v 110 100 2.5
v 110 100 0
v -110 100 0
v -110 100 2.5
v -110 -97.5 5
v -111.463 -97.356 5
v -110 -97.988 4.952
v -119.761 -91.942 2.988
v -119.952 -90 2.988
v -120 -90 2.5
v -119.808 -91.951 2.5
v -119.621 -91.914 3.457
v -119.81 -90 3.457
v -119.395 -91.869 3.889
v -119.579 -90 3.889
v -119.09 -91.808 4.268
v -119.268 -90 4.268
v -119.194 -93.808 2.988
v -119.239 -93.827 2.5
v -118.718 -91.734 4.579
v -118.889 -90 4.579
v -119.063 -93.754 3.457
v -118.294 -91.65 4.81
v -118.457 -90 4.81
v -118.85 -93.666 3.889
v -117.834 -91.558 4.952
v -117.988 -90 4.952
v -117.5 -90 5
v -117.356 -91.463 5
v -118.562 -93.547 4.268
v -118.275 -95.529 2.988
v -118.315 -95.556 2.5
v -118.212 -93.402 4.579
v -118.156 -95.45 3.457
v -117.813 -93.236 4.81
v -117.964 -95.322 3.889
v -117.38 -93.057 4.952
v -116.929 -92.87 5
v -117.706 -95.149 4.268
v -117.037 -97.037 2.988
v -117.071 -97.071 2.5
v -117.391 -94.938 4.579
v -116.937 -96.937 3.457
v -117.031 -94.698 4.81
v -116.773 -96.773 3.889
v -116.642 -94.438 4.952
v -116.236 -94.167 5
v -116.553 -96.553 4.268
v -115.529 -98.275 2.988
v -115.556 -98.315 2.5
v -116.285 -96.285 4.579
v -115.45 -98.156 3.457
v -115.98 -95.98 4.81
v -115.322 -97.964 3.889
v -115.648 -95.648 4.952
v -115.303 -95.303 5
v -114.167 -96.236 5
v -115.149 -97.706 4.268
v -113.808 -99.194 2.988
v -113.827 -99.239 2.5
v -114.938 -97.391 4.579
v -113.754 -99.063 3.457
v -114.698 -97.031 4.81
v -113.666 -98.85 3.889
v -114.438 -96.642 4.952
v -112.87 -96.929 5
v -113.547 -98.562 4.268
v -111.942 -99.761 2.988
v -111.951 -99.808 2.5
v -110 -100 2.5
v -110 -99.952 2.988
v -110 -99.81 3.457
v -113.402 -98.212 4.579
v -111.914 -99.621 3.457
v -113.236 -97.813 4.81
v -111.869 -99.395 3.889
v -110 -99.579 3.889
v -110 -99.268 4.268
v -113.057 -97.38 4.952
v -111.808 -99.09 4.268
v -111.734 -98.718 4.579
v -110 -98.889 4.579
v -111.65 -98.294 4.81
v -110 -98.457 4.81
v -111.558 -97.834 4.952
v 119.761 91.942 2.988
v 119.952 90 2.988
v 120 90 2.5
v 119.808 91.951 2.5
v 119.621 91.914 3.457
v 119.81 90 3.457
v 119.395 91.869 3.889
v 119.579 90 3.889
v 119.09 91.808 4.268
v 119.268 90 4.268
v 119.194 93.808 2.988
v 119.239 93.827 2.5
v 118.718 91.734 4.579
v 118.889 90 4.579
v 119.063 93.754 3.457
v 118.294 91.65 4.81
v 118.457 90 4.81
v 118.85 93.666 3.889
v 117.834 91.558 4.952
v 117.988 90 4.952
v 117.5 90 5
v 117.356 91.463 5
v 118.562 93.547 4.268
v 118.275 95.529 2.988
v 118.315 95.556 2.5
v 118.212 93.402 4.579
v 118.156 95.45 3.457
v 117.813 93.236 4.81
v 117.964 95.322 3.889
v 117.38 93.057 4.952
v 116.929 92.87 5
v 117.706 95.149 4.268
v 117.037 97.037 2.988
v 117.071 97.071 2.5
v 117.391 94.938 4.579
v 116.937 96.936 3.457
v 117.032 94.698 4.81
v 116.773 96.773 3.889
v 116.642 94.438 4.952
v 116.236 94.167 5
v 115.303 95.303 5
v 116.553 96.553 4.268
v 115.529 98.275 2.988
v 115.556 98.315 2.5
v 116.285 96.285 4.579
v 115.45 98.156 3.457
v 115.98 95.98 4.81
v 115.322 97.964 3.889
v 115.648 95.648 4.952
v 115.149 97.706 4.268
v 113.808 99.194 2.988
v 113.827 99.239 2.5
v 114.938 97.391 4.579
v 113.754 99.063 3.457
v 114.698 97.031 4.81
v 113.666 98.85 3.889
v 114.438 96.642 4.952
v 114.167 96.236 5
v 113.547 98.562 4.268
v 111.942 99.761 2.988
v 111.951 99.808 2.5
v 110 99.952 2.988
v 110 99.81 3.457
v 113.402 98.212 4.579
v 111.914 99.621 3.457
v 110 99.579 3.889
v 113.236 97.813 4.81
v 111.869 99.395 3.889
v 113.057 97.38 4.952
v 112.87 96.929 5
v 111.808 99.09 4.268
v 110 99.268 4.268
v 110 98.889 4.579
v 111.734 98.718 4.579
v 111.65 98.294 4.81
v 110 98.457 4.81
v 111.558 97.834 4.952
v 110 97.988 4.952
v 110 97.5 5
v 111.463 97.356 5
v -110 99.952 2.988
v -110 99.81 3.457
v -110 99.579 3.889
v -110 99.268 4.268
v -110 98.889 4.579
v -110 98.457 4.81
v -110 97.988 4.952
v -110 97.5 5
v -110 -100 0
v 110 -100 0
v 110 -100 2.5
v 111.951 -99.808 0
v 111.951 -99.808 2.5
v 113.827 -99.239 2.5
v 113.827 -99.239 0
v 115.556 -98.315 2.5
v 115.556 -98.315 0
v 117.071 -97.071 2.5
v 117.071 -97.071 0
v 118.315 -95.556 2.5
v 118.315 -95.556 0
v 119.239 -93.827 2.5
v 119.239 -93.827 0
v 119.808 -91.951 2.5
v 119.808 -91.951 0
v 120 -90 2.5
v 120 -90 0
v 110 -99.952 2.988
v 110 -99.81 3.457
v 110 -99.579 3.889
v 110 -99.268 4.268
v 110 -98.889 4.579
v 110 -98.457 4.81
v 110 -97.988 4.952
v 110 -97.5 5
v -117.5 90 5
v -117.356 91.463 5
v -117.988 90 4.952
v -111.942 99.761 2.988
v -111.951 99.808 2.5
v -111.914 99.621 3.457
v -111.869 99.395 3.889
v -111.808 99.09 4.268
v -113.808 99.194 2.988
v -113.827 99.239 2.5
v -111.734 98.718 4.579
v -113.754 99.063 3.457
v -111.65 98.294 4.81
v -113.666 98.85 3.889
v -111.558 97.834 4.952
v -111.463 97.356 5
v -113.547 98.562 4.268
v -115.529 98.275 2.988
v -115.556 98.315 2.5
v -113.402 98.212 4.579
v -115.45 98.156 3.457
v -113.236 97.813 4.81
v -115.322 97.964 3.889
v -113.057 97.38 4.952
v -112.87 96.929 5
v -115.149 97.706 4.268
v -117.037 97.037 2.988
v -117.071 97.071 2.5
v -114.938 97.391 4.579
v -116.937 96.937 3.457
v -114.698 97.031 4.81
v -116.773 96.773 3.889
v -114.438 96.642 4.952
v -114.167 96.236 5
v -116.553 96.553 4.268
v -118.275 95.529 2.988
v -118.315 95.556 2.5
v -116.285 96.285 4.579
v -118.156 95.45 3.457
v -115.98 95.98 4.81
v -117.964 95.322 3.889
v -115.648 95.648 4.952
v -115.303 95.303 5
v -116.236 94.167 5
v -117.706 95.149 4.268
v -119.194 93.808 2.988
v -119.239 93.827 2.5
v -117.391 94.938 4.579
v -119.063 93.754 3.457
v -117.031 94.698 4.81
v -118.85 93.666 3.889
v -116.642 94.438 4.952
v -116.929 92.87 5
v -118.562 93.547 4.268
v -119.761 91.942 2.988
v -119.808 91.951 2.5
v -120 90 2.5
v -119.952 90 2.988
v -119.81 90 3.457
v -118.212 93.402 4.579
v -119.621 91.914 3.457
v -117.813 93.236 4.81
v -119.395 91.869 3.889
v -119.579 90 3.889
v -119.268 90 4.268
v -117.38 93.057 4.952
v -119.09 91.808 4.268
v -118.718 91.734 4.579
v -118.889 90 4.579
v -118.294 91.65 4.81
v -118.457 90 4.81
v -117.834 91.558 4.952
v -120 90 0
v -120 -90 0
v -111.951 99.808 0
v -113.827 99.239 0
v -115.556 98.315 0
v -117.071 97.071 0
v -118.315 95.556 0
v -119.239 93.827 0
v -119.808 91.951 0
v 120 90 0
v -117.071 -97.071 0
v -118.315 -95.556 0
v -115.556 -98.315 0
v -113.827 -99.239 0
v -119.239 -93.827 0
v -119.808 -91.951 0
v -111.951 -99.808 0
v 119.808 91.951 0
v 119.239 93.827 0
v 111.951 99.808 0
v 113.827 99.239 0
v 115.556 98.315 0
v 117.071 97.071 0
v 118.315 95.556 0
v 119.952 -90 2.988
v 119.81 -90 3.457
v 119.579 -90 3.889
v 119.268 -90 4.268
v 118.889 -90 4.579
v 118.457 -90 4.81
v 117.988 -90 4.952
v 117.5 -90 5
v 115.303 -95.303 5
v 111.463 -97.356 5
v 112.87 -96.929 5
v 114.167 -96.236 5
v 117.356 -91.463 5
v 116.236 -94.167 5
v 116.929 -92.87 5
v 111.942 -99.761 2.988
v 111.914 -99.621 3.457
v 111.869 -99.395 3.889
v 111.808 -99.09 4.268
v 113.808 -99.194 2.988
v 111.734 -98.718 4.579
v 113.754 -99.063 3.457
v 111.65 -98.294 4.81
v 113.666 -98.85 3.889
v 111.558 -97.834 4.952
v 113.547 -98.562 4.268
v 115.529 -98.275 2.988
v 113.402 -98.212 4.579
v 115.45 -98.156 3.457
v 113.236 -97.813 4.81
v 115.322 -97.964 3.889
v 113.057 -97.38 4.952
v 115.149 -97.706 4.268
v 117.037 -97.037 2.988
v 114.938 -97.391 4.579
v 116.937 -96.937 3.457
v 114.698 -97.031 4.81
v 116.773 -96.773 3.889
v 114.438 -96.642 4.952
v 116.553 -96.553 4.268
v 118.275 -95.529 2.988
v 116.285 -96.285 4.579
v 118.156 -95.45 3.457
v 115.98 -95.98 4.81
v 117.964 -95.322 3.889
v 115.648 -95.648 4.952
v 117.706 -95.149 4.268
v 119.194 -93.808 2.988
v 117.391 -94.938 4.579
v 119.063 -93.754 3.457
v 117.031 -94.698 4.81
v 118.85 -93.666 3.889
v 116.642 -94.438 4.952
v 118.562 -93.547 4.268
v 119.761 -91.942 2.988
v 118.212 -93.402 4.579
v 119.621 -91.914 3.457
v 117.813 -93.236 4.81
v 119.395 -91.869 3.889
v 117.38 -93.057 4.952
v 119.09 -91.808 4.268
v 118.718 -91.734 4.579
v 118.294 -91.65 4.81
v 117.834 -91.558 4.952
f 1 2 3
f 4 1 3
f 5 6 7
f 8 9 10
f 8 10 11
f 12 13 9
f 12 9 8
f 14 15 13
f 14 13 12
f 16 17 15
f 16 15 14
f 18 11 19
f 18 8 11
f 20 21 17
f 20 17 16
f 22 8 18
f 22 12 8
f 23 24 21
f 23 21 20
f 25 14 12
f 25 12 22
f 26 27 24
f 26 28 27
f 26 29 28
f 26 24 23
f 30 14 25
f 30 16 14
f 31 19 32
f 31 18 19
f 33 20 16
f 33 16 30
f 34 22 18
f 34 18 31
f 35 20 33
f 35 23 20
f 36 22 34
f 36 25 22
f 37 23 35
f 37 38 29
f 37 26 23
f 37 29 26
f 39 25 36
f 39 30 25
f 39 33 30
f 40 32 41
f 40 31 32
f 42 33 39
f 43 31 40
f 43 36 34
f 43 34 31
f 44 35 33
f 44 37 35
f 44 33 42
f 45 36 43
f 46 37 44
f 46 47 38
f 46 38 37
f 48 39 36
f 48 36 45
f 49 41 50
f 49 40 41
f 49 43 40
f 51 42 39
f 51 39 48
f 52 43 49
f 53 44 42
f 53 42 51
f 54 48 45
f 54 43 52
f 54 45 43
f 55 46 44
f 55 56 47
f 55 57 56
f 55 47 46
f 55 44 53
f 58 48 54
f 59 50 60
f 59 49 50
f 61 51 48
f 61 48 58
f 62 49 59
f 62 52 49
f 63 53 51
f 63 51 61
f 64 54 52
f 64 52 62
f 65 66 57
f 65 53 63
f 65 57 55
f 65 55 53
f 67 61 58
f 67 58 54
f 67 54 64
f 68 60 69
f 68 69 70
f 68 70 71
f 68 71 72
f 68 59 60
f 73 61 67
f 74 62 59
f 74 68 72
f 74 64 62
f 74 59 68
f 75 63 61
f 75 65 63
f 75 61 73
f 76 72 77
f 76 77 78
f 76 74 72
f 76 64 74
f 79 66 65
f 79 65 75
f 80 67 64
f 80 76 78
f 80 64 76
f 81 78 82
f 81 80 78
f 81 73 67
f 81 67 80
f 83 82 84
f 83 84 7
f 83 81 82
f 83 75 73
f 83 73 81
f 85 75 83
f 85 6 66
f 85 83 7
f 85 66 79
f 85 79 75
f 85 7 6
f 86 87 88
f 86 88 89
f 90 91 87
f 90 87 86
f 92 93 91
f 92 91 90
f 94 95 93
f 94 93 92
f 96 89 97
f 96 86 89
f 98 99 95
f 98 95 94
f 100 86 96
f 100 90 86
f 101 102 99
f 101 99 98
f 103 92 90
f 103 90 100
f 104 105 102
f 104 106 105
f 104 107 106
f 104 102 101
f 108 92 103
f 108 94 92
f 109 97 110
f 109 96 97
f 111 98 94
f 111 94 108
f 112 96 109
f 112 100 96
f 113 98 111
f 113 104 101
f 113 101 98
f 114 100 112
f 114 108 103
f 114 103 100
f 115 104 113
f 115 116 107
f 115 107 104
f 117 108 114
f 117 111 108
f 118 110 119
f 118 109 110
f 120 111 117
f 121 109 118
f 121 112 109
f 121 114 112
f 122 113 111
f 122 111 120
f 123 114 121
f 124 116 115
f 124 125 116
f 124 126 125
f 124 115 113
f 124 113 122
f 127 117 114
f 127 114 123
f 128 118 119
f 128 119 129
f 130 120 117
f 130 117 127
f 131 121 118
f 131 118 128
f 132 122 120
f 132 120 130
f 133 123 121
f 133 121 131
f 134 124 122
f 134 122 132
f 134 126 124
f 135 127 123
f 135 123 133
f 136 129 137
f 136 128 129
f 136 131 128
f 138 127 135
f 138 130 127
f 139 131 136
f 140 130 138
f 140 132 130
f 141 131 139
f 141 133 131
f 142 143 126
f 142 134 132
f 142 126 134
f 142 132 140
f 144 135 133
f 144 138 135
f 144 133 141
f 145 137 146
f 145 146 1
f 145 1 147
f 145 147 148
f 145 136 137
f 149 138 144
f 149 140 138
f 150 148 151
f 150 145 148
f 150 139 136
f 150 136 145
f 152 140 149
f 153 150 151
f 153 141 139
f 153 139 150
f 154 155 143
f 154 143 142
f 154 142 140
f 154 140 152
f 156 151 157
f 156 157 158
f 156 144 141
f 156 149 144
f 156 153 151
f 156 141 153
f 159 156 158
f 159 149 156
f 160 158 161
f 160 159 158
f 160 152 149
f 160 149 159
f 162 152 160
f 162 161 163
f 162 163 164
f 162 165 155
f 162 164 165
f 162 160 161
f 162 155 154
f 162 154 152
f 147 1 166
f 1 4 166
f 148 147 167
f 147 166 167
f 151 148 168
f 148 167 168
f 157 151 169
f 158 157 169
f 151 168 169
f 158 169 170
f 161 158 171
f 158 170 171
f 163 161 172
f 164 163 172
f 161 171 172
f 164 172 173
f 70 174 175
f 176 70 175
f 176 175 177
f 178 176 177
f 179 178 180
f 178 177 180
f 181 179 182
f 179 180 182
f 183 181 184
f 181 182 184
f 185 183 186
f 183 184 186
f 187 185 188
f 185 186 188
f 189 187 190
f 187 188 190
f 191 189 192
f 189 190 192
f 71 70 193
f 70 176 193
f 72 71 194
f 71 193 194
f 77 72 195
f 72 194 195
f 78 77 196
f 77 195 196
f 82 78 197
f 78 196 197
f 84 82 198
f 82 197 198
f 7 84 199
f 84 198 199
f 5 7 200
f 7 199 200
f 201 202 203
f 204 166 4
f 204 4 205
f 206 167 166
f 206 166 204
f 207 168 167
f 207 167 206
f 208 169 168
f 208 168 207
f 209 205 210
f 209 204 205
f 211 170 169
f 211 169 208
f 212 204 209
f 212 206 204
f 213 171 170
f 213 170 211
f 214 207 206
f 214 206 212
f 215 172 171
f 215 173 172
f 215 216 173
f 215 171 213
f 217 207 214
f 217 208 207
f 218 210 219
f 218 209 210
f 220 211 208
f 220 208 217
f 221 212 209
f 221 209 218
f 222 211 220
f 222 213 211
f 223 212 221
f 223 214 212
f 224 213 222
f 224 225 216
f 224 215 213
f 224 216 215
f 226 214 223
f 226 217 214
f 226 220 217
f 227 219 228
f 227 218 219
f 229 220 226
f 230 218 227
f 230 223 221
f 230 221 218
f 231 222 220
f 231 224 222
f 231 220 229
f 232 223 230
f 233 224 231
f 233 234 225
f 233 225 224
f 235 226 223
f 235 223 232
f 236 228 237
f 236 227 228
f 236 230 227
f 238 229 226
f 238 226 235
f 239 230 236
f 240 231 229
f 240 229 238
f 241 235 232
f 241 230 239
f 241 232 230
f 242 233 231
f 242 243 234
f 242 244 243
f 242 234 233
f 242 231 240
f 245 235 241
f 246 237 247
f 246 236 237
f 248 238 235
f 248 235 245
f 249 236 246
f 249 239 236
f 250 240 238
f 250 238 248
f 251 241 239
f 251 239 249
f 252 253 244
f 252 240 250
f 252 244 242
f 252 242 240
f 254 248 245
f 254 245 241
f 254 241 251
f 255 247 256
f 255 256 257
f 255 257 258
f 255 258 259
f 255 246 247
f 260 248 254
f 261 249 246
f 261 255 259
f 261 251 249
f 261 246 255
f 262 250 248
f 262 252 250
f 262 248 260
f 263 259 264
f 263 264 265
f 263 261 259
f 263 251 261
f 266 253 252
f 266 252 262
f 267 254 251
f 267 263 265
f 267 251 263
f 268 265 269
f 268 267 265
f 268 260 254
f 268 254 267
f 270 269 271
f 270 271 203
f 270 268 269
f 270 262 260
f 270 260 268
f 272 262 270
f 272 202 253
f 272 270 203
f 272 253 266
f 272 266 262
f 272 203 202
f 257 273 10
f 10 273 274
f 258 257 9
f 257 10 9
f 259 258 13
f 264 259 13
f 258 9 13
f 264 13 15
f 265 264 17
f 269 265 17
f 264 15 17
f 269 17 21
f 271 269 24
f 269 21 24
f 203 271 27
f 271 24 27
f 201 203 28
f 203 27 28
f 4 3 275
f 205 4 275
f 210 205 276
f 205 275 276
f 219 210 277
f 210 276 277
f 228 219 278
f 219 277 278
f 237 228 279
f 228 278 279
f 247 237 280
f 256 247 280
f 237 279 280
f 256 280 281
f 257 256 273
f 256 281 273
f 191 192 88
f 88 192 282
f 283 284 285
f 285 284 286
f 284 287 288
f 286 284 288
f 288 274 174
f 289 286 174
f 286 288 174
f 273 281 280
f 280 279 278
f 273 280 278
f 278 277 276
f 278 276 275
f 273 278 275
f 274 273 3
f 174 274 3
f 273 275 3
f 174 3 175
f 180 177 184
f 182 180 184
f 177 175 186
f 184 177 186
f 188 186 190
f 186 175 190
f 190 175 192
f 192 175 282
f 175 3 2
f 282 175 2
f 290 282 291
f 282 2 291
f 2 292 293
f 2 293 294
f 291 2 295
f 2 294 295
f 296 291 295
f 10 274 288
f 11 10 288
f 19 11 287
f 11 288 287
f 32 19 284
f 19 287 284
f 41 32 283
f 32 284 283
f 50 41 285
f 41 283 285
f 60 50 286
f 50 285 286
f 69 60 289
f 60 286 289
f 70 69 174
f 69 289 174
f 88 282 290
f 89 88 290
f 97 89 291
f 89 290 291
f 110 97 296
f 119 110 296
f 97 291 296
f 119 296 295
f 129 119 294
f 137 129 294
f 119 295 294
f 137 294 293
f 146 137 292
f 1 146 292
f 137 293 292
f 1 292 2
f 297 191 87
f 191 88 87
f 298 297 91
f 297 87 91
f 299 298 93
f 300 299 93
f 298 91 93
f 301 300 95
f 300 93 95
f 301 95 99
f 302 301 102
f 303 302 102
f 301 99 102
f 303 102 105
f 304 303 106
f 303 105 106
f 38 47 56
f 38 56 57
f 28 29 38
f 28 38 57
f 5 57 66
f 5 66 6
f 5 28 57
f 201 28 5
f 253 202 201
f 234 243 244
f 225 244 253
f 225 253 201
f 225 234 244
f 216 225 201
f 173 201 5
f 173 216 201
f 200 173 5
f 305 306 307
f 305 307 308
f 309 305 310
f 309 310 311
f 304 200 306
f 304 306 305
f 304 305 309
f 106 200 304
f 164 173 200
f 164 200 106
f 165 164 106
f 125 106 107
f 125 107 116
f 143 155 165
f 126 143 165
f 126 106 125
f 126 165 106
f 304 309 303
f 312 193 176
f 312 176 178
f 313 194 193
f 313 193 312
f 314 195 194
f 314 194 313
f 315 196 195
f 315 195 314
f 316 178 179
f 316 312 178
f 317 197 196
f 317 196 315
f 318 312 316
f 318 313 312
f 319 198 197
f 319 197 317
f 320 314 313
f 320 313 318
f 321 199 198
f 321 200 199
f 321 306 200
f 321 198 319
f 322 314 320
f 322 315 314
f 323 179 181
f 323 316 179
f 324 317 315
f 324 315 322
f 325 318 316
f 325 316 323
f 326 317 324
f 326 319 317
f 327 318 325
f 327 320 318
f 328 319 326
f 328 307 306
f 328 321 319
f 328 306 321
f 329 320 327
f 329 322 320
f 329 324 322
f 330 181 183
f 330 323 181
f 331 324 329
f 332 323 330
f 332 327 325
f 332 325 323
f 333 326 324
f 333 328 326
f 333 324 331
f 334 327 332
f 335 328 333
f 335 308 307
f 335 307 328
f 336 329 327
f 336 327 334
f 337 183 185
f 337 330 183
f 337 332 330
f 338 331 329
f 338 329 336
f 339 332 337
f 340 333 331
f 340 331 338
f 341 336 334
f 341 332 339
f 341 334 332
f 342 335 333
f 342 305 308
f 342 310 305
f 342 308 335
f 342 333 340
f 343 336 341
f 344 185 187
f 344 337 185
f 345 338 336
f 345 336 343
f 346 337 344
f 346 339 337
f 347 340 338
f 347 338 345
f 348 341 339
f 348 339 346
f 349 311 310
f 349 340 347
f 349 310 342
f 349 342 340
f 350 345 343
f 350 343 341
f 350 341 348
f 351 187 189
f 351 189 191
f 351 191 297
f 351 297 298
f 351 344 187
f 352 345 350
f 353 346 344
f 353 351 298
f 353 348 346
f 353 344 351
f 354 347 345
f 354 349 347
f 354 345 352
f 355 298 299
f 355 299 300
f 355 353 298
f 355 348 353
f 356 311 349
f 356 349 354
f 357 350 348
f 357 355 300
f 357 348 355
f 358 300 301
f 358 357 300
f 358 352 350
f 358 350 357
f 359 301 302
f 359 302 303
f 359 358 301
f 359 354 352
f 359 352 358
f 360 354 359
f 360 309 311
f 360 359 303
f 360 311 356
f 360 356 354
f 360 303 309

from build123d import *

# Parameters (mm, degrees)
EXTRUDE_DEPTH = 5
FILLET_R      = 2.5


with BuildPart() as part:
    # Sketch → Extrude (new body)
    with BuildSketch(Plane.XY):
        with BuildLine():
            Line((-120, 90), (-120, -90))
            ThreePointArc((-120, -90), (-117.071068, -97.071068), (-110, -100))
            Line((-110, -100), (110, -100))
            ThreePointArc((110, -100), (117.071068, -97.071068), (120, -90))
            Line((120, -90), (120, 89.999999))
            ThreePointArc((120, 89.999999), (117.071077, 97.071059), (110.000024, 100))
            Line((110.000024, 100), (-110, 100))
            ThreePointArc((-110, 100), (-117.071068, 97.071068), (-120, 90))
        make_face()
    extrude(amount=EXTRUDE_DEPTH)

    # Fillet
    fillet_edges = [part.edges().sort_by_distance(p)[0] for p in [
        (-120, 0, 5),
        (-117.071068, -97.071068, 5),
        (0, -100, 5),
        (117.071068, -97.071068, 5),
        (120, -1e-06, 5),
        (117.071077, 97.071059, 5),
        (1.2e-05, 100, 5),
        (-117.071068, 97.071068, 5),
    ]]
    fillet(fillet_edges, radius=FILLET_R)


solid = part.part
